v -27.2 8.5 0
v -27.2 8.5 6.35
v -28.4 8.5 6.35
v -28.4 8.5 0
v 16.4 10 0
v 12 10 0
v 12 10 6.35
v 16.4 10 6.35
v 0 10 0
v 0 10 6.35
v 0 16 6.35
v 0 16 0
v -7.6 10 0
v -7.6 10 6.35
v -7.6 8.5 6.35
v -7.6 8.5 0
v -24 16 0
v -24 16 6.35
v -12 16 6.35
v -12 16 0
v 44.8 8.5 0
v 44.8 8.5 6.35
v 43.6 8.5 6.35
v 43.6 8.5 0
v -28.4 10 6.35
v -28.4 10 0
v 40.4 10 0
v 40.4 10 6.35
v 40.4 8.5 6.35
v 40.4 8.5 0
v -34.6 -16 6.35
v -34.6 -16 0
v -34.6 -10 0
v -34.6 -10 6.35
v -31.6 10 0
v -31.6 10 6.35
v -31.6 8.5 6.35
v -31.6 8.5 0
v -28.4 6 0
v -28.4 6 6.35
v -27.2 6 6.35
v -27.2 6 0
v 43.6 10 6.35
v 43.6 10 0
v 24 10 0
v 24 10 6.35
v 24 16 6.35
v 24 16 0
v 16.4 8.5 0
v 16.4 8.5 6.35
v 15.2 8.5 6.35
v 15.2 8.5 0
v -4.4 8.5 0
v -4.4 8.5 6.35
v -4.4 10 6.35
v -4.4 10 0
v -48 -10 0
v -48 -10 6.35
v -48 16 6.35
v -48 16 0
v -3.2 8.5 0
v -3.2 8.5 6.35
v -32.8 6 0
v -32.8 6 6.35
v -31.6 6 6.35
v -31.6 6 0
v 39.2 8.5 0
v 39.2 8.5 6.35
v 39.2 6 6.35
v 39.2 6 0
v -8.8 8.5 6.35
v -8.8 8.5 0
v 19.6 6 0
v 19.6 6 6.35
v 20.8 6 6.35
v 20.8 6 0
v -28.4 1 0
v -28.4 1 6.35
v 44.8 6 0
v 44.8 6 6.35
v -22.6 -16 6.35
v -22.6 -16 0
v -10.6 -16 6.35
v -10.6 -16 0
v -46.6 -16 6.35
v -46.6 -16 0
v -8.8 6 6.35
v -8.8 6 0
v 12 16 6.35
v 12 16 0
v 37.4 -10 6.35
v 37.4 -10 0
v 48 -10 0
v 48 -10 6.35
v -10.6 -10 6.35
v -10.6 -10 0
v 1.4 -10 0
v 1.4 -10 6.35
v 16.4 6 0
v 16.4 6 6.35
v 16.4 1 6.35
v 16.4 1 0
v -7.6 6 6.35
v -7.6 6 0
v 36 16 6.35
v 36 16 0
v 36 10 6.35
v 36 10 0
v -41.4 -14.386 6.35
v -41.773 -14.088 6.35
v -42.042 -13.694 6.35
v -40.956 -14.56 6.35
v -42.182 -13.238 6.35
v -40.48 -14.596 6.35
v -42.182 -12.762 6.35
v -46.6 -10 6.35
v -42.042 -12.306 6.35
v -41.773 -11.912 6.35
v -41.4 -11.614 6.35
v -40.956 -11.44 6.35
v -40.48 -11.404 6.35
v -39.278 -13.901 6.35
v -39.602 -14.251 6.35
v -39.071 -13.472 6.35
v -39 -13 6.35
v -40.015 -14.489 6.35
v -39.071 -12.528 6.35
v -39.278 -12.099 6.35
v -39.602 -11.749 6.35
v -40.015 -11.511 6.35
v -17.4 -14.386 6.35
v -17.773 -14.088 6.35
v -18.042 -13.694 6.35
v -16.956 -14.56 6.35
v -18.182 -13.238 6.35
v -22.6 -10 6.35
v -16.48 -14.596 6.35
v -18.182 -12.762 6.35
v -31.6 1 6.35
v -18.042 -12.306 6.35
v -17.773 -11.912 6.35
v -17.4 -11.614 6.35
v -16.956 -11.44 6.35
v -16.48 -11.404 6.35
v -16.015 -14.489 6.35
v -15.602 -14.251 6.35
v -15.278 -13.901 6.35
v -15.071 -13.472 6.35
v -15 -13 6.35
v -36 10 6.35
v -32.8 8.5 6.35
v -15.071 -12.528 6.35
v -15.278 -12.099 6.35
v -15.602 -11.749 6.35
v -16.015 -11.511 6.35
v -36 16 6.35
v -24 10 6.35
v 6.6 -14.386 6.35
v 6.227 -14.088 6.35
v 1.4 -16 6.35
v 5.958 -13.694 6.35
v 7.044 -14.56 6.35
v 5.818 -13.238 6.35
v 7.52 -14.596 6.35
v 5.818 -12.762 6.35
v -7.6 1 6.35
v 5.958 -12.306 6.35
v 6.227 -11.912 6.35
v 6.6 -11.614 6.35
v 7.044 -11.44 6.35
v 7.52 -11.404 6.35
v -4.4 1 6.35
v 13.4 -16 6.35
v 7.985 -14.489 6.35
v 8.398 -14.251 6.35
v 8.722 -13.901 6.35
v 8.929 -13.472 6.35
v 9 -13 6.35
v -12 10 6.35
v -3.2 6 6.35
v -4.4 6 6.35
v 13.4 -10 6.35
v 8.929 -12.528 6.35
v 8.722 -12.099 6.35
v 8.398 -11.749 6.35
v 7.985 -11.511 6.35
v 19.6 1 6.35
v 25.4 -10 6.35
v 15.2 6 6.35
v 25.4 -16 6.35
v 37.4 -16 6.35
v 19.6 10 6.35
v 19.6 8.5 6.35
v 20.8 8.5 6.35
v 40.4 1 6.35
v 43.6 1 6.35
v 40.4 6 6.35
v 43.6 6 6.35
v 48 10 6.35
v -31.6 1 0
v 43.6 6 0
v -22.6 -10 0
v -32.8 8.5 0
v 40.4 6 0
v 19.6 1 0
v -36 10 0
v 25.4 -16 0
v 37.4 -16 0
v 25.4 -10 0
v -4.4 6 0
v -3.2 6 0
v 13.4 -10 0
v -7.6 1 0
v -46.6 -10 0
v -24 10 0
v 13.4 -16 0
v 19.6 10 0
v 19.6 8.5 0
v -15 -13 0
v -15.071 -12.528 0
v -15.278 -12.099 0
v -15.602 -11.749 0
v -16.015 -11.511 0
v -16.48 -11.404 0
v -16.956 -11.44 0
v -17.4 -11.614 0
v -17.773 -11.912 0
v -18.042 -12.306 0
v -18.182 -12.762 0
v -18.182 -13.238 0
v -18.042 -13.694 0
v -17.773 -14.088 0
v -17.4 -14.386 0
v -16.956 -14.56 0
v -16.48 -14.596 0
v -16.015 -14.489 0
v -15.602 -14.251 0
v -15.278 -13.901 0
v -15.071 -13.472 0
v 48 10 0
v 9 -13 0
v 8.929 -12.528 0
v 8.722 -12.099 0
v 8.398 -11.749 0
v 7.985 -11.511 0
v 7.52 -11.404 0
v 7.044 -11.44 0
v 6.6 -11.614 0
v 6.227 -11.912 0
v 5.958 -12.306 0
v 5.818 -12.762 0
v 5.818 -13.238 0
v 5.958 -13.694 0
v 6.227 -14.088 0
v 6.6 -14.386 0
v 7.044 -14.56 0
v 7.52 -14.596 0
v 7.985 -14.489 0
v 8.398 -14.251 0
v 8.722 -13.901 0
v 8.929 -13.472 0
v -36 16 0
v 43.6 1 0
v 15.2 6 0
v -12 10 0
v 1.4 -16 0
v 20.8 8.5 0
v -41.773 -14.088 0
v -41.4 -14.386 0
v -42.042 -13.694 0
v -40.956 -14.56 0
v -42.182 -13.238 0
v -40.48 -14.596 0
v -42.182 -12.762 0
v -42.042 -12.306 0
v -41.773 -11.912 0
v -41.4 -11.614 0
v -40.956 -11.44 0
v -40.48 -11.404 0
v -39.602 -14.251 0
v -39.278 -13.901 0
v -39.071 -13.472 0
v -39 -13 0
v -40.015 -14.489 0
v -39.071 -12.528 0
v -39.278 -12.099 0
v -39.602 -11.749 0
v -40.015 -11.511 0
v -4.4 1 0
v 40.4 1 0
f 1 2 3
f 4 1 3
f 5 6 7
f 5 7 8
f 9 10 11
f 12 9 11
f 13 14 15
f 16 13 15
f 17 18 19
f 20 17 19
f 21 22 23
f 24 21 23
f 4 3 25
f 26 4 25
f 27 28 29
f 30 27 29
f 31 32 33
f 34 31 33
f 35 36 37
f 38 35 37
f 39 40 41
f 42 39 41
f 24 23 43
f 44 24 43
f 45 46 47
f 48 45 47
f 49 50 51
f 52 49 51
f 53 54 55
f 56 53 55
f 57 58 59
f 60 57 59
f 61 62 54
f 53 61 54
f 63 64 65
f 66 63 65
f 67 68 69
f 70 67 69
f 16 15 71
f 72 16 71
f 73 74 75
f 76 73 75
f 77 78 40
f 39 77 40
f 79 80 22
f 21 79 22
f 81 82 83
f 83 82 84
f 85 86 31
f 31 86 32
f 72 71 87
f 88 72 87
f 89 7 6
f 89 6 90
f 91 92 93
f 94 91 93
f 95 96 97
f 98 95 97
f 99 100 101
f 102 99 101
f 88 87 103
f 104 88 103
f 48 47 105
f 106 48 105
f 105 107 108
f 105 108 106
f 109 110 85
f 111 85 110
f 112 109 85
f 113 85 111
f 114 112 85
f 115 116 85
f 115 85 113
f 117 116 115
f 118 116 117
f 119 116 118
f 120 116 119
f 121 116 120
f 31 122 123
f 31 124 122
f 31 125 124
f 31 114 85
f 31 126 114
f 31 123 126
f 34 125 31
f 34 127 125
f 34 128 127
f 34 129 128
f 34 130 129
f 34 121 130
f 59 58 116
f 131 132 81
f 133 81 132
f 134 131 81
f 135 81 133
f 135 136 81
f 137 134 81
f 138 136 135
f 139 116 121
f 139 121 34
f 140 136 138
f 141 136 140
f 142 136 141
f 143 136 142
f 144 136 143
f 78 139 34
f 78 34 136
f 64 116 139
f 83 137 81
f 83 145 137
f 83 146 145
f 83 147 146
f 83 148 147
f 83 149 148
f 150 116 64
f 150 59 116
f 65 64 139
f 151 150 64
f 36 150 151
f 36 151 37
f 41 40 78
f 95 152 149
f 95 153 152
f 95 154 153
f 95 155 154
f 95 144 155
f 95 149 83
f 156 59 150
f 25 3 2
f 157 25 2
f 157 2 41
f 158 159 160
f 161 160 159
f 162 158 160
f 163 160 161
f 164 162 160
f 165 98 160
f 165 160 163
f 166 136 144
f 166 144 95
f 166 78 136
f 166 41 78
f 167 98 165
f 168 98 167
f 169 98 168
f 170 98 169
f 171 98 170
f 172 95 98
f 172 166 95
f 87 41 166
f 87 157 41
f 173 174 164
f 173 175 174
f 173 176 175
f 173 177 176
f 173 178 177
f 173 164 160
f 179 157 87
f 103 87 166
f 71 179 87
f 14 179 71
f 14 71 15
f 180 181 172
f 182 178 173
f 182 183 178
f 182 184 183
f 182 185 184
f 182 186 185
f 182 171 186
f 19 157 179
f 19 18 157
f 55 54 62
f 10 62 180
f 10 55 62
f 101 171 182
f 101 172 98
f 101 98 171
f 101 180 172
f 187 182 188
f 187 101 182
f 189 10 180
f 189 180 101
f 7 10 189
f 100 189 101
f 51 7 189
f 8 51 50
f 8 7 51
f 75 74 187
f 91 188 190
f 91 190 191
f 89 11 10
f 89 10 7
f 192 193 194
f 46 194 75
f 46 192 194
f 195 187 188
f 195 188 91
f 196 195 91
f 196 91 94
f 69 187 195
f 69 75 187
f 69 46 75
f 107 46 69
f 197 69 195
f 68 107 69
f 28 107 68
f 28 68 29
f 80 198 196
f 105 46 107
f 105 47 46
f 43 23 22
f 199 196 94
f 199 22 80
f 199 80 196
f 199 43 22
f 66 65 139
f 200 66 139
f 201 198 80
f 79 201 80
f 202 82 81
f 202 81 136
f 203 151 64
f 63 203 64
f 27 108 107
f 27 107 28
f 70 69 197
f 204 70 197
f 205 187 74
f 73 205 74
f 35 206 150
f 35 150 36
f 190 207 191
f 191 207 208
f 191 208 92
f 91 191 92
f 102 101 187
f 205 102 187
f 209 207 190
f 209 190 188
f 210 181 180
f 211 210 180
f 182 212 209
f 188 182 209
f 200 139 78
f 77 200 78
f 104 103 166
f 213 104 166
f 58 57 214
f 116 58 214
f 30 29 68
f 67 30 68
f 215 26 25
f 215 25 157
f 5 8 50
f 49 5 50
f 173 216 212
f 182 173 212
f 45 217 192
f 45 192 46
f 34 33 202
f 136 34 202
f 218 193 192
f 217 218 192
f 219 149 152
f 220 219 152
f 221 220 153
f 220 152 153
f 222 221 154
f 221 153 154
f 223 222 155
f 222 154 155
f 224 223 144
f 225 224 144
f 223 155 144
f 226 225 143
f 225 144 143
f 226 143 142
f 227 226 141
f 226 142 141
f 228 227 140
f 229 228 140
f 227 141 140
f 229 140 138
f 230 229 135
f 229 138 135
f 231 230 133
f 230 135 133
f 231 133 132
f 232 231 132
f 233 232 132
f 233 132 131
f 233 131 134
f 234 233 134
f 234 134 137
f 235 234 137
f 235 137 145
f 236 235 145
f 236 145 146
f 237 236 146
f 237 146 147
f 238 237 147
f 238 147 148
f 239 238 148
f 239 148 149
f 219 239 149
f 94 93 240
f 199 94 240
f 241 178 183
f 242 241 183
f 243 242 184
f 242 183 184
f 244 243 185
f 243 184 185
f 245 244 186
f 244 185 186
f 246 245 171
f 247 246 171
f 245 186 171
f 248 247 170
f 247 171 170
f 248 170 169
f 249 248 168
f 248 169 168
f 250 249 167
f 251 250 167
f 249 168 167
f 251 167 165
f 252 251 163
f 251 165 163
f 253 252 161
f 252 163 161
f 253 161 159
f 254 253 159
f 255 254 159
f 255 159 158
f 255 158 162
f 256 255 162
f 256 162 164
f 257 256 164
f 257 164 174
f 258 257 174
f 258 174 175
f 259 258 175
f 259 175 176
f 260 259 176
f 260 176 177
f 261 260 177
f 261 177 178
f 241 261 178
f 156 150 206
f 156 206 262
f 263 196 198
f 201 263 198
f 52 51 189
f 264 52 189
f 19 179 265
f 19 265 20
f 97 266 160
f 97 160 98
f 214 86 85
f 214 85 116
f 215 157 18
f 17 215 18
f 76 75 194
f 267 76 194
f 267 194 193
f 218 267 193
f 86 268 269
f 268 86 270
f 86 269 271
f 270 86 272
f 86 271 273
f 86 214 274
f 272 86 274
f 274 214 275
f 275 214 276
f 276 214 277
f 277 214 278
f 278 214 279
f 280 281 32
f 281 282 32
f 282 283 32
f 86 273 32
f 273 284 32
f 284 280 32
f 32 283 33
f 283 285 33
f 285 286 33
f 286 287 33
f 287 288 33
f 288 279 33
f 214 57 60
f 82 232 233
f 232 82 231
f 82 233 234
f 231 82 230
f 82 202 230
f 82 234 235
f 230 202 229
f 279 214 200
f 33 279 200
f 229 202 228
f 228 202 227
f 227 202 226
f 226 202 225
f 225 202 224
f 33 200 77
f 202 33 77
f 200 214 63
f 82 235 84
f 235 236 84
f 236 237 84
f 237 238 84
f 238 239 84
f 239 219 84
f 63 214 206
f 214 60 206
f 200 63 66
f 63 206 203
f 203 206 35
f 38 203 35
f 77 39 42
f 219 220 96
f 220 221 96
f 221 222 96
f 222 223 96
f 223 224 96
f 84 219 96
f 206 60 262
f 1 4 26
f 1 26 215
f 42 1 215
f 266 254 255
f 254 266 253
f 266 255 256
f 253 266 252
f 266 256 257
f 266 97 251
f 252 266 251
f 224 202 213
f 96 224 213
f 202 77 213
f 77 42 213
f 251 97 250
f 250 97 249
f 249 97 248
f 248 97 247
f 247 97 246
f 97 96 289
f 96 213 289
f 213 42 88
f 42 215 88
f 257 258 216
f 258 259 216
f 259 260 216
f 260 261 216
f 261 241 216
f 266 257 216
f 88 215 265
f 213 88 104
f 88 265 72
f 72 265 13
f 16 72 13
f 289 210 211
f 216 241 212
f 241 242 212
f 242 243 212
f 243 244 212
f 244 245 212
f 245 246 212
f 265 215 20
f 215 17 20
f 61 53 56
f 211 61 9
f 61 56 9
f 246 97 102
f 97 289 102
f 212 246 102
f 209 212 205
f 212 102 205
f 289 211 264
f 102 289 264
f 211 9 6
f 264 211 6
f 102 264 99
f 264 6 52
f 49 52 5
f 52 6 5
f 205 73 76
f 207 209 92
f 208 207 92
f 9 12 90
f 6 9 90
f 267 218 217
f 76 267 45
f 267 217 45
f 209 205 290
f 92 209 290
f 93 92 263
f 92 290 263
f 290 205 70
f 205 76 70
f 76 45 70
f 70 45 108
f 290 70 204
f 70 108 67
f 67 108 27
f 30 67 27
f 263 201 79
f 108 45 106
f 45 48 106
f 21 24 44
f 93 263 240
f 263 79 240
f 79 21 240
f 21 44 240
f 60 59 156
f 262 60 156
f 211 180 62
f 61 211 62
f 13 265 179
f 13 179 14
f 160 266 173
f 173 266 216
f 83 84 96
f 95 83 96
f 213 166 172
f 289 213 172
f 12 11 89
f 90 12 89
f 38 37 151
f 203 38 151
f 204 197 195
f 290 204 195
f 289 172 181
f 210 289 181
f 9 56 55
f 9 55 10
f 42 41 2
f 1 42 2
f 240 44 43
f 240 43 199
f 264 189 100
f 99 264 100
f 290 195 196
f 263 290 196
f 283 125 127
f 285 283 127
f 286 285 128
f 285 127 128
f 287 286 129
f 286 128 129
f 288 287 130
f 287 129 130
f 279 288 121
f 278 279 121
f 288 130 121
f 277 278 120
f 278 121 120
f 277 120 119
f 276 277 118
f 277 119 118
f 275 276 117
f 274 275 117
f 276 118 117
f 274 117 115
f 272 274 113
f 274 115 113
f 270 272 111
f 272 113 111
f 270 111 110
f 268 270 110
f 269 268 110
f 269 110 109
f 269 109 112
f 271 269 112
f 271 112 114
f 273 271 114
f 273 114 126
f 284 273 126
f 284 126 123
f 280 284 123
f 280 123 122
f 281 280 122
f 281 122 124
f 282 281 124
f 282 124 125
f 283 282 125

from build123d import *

# Parameters (mm, degrees)
SKETCH1_W           = 96
SKETCH1_H           = 20
BOSS_EXTRUDE1_DEPTH = 6.35
SKETCH2_W           = 12
SKETCH2_H           = 6
BOSS_EXTRUDE2_DEPTH = 6.35
LPATTERN2_COUNT     = 4
LPATTERN2_PITCH     = 24
CUT_EXTRUDE1_DEPTH  = 51.993357411
SKETCH6_W           = 12
SKETCH6_H           = 6
BOSS_EXTRUDE3_DEPTH = 6.35
LPATTERN3_COUNT     = 4
LPATTERN3_PITCH     = 24
SKETCH7_R           = 1.6
CUT_EXTRUDE3_DEPTH  = 51.993357411
LPATTERN4_COUNT     = 3
LPATTERN4_PITCH     = 24


with BuildPart() as part:
    # Sketch1 → Boss-Extrude1 (new body)
    with BuildSketch(Plane.XY):
        Rectangle(SKETCH1_W, SKETCH1_H)
    extrude(amount=BOSS_EXTRUDE1_DEPTH)

    # Sketch2 → Boss-Extrude2 (add)
    with BuildSketch(Plane.XY.offset(6.35)):
        with Locations((-42, 13)):
            Rectangle(SKETCH2_W, SKETCH2_H)
    boss_extrude2 = extrude(amount=-BOSS_EXTRUDE2_DEPTH)

    # LPattern2: Boss-Extrude2 ×4
    with Locations(*[(i * LPATTERN2_PITCH, 0, 0) for i in range(1, LPATTERN2_COUNT)]):
        add(boss_extrude2)

    # Sketch3 → Cut-Extrude1 (cut, through all)
    with BuildSketch(Plane.XY.offset(6.35)):
        Polygon((-31.6, 10), (-31.6, 8.5), (-32.8, 8.5), (-32.8, 6), (-31.6, 6), (-31.6, 1), (-28.4, 1), (-28.4, 6), (-27.2, 6), (-27.2, 8.5), (-28.4, 8.5), (-28.4, 10), align=None)
        Polygon((-7.6, 10), (-7.6, 8.5), (-8.8, 8.5), (-8.8, 6), (-7.6, 6), (-7.6, 1), (-4.4, 1), (-4.4, 6), (-3.2, 6), (-3.2, 8.5), (-4.4, 8.5), (-4.4, 10), align=None)
        Polygon((16.4, 10), (16.4, 8.5), (15.2, 8.5), (15.2, 6), (16.4, 6), (16.4, 1), (19.6, 1), (19.6, 6), (20.8, 6), (20.8, 8.5), (19.6, 8.5), (19.6, 10), align=None)
        Polygon((40.4, 10), (40.4, 8.5), (39.2, 8.5), (39.2, 6), (40.4, 6), (40.4, 1), (43.6, 1), (43.6, 6), (44.8, 6), (44.8, 8.5), (43.6, 8.5), (43.6, 10), align=None)
    extrude(amount=-CUT_EXTRUDE1_DEPTH, mode=Mode.SUBTRACT)

    # Sketch6 → Boss-Extrude3 (add)
    with BuildSketch(Plane.XY):
        with Locations((-40.6, -13)):
            Rectangle(SKETCH6_W, SKETCH6_H)
    boss_extrude3 = extrude(amount=BOSS_EXTRUDE3_DEPTH)

    # LPattern3: Boss-Extrude3 ×4
    with Locations(*[(i * LPATTERN3_PITCH, 0, 0) for i in range(1, LPATTERN3_COUNT)]):
        add(boss_extrude3)

    # Sketch7 → Cut-Extrude3 (cut, through all)
    with BuildSketch(Plane.XY.offset(6.35)):
        with Locations((-40.6, -13)):
            Circle(SKETCH7_R)
    cut_extrude3 = extrude(amount=-CUT_EXTRUDE3_DEPTH, mode=Mode.SUBTRACT)

    # LPattern4: Cut-Extrude3 ×3
    with Locations(*[(i * LPATTERN4_PITCH, 0, 0) for i in range(1, LPATTERN4_COUNT)]):
        add(cut_extrude3, mode=Mode.SUBTRACT)


solid = part.part
